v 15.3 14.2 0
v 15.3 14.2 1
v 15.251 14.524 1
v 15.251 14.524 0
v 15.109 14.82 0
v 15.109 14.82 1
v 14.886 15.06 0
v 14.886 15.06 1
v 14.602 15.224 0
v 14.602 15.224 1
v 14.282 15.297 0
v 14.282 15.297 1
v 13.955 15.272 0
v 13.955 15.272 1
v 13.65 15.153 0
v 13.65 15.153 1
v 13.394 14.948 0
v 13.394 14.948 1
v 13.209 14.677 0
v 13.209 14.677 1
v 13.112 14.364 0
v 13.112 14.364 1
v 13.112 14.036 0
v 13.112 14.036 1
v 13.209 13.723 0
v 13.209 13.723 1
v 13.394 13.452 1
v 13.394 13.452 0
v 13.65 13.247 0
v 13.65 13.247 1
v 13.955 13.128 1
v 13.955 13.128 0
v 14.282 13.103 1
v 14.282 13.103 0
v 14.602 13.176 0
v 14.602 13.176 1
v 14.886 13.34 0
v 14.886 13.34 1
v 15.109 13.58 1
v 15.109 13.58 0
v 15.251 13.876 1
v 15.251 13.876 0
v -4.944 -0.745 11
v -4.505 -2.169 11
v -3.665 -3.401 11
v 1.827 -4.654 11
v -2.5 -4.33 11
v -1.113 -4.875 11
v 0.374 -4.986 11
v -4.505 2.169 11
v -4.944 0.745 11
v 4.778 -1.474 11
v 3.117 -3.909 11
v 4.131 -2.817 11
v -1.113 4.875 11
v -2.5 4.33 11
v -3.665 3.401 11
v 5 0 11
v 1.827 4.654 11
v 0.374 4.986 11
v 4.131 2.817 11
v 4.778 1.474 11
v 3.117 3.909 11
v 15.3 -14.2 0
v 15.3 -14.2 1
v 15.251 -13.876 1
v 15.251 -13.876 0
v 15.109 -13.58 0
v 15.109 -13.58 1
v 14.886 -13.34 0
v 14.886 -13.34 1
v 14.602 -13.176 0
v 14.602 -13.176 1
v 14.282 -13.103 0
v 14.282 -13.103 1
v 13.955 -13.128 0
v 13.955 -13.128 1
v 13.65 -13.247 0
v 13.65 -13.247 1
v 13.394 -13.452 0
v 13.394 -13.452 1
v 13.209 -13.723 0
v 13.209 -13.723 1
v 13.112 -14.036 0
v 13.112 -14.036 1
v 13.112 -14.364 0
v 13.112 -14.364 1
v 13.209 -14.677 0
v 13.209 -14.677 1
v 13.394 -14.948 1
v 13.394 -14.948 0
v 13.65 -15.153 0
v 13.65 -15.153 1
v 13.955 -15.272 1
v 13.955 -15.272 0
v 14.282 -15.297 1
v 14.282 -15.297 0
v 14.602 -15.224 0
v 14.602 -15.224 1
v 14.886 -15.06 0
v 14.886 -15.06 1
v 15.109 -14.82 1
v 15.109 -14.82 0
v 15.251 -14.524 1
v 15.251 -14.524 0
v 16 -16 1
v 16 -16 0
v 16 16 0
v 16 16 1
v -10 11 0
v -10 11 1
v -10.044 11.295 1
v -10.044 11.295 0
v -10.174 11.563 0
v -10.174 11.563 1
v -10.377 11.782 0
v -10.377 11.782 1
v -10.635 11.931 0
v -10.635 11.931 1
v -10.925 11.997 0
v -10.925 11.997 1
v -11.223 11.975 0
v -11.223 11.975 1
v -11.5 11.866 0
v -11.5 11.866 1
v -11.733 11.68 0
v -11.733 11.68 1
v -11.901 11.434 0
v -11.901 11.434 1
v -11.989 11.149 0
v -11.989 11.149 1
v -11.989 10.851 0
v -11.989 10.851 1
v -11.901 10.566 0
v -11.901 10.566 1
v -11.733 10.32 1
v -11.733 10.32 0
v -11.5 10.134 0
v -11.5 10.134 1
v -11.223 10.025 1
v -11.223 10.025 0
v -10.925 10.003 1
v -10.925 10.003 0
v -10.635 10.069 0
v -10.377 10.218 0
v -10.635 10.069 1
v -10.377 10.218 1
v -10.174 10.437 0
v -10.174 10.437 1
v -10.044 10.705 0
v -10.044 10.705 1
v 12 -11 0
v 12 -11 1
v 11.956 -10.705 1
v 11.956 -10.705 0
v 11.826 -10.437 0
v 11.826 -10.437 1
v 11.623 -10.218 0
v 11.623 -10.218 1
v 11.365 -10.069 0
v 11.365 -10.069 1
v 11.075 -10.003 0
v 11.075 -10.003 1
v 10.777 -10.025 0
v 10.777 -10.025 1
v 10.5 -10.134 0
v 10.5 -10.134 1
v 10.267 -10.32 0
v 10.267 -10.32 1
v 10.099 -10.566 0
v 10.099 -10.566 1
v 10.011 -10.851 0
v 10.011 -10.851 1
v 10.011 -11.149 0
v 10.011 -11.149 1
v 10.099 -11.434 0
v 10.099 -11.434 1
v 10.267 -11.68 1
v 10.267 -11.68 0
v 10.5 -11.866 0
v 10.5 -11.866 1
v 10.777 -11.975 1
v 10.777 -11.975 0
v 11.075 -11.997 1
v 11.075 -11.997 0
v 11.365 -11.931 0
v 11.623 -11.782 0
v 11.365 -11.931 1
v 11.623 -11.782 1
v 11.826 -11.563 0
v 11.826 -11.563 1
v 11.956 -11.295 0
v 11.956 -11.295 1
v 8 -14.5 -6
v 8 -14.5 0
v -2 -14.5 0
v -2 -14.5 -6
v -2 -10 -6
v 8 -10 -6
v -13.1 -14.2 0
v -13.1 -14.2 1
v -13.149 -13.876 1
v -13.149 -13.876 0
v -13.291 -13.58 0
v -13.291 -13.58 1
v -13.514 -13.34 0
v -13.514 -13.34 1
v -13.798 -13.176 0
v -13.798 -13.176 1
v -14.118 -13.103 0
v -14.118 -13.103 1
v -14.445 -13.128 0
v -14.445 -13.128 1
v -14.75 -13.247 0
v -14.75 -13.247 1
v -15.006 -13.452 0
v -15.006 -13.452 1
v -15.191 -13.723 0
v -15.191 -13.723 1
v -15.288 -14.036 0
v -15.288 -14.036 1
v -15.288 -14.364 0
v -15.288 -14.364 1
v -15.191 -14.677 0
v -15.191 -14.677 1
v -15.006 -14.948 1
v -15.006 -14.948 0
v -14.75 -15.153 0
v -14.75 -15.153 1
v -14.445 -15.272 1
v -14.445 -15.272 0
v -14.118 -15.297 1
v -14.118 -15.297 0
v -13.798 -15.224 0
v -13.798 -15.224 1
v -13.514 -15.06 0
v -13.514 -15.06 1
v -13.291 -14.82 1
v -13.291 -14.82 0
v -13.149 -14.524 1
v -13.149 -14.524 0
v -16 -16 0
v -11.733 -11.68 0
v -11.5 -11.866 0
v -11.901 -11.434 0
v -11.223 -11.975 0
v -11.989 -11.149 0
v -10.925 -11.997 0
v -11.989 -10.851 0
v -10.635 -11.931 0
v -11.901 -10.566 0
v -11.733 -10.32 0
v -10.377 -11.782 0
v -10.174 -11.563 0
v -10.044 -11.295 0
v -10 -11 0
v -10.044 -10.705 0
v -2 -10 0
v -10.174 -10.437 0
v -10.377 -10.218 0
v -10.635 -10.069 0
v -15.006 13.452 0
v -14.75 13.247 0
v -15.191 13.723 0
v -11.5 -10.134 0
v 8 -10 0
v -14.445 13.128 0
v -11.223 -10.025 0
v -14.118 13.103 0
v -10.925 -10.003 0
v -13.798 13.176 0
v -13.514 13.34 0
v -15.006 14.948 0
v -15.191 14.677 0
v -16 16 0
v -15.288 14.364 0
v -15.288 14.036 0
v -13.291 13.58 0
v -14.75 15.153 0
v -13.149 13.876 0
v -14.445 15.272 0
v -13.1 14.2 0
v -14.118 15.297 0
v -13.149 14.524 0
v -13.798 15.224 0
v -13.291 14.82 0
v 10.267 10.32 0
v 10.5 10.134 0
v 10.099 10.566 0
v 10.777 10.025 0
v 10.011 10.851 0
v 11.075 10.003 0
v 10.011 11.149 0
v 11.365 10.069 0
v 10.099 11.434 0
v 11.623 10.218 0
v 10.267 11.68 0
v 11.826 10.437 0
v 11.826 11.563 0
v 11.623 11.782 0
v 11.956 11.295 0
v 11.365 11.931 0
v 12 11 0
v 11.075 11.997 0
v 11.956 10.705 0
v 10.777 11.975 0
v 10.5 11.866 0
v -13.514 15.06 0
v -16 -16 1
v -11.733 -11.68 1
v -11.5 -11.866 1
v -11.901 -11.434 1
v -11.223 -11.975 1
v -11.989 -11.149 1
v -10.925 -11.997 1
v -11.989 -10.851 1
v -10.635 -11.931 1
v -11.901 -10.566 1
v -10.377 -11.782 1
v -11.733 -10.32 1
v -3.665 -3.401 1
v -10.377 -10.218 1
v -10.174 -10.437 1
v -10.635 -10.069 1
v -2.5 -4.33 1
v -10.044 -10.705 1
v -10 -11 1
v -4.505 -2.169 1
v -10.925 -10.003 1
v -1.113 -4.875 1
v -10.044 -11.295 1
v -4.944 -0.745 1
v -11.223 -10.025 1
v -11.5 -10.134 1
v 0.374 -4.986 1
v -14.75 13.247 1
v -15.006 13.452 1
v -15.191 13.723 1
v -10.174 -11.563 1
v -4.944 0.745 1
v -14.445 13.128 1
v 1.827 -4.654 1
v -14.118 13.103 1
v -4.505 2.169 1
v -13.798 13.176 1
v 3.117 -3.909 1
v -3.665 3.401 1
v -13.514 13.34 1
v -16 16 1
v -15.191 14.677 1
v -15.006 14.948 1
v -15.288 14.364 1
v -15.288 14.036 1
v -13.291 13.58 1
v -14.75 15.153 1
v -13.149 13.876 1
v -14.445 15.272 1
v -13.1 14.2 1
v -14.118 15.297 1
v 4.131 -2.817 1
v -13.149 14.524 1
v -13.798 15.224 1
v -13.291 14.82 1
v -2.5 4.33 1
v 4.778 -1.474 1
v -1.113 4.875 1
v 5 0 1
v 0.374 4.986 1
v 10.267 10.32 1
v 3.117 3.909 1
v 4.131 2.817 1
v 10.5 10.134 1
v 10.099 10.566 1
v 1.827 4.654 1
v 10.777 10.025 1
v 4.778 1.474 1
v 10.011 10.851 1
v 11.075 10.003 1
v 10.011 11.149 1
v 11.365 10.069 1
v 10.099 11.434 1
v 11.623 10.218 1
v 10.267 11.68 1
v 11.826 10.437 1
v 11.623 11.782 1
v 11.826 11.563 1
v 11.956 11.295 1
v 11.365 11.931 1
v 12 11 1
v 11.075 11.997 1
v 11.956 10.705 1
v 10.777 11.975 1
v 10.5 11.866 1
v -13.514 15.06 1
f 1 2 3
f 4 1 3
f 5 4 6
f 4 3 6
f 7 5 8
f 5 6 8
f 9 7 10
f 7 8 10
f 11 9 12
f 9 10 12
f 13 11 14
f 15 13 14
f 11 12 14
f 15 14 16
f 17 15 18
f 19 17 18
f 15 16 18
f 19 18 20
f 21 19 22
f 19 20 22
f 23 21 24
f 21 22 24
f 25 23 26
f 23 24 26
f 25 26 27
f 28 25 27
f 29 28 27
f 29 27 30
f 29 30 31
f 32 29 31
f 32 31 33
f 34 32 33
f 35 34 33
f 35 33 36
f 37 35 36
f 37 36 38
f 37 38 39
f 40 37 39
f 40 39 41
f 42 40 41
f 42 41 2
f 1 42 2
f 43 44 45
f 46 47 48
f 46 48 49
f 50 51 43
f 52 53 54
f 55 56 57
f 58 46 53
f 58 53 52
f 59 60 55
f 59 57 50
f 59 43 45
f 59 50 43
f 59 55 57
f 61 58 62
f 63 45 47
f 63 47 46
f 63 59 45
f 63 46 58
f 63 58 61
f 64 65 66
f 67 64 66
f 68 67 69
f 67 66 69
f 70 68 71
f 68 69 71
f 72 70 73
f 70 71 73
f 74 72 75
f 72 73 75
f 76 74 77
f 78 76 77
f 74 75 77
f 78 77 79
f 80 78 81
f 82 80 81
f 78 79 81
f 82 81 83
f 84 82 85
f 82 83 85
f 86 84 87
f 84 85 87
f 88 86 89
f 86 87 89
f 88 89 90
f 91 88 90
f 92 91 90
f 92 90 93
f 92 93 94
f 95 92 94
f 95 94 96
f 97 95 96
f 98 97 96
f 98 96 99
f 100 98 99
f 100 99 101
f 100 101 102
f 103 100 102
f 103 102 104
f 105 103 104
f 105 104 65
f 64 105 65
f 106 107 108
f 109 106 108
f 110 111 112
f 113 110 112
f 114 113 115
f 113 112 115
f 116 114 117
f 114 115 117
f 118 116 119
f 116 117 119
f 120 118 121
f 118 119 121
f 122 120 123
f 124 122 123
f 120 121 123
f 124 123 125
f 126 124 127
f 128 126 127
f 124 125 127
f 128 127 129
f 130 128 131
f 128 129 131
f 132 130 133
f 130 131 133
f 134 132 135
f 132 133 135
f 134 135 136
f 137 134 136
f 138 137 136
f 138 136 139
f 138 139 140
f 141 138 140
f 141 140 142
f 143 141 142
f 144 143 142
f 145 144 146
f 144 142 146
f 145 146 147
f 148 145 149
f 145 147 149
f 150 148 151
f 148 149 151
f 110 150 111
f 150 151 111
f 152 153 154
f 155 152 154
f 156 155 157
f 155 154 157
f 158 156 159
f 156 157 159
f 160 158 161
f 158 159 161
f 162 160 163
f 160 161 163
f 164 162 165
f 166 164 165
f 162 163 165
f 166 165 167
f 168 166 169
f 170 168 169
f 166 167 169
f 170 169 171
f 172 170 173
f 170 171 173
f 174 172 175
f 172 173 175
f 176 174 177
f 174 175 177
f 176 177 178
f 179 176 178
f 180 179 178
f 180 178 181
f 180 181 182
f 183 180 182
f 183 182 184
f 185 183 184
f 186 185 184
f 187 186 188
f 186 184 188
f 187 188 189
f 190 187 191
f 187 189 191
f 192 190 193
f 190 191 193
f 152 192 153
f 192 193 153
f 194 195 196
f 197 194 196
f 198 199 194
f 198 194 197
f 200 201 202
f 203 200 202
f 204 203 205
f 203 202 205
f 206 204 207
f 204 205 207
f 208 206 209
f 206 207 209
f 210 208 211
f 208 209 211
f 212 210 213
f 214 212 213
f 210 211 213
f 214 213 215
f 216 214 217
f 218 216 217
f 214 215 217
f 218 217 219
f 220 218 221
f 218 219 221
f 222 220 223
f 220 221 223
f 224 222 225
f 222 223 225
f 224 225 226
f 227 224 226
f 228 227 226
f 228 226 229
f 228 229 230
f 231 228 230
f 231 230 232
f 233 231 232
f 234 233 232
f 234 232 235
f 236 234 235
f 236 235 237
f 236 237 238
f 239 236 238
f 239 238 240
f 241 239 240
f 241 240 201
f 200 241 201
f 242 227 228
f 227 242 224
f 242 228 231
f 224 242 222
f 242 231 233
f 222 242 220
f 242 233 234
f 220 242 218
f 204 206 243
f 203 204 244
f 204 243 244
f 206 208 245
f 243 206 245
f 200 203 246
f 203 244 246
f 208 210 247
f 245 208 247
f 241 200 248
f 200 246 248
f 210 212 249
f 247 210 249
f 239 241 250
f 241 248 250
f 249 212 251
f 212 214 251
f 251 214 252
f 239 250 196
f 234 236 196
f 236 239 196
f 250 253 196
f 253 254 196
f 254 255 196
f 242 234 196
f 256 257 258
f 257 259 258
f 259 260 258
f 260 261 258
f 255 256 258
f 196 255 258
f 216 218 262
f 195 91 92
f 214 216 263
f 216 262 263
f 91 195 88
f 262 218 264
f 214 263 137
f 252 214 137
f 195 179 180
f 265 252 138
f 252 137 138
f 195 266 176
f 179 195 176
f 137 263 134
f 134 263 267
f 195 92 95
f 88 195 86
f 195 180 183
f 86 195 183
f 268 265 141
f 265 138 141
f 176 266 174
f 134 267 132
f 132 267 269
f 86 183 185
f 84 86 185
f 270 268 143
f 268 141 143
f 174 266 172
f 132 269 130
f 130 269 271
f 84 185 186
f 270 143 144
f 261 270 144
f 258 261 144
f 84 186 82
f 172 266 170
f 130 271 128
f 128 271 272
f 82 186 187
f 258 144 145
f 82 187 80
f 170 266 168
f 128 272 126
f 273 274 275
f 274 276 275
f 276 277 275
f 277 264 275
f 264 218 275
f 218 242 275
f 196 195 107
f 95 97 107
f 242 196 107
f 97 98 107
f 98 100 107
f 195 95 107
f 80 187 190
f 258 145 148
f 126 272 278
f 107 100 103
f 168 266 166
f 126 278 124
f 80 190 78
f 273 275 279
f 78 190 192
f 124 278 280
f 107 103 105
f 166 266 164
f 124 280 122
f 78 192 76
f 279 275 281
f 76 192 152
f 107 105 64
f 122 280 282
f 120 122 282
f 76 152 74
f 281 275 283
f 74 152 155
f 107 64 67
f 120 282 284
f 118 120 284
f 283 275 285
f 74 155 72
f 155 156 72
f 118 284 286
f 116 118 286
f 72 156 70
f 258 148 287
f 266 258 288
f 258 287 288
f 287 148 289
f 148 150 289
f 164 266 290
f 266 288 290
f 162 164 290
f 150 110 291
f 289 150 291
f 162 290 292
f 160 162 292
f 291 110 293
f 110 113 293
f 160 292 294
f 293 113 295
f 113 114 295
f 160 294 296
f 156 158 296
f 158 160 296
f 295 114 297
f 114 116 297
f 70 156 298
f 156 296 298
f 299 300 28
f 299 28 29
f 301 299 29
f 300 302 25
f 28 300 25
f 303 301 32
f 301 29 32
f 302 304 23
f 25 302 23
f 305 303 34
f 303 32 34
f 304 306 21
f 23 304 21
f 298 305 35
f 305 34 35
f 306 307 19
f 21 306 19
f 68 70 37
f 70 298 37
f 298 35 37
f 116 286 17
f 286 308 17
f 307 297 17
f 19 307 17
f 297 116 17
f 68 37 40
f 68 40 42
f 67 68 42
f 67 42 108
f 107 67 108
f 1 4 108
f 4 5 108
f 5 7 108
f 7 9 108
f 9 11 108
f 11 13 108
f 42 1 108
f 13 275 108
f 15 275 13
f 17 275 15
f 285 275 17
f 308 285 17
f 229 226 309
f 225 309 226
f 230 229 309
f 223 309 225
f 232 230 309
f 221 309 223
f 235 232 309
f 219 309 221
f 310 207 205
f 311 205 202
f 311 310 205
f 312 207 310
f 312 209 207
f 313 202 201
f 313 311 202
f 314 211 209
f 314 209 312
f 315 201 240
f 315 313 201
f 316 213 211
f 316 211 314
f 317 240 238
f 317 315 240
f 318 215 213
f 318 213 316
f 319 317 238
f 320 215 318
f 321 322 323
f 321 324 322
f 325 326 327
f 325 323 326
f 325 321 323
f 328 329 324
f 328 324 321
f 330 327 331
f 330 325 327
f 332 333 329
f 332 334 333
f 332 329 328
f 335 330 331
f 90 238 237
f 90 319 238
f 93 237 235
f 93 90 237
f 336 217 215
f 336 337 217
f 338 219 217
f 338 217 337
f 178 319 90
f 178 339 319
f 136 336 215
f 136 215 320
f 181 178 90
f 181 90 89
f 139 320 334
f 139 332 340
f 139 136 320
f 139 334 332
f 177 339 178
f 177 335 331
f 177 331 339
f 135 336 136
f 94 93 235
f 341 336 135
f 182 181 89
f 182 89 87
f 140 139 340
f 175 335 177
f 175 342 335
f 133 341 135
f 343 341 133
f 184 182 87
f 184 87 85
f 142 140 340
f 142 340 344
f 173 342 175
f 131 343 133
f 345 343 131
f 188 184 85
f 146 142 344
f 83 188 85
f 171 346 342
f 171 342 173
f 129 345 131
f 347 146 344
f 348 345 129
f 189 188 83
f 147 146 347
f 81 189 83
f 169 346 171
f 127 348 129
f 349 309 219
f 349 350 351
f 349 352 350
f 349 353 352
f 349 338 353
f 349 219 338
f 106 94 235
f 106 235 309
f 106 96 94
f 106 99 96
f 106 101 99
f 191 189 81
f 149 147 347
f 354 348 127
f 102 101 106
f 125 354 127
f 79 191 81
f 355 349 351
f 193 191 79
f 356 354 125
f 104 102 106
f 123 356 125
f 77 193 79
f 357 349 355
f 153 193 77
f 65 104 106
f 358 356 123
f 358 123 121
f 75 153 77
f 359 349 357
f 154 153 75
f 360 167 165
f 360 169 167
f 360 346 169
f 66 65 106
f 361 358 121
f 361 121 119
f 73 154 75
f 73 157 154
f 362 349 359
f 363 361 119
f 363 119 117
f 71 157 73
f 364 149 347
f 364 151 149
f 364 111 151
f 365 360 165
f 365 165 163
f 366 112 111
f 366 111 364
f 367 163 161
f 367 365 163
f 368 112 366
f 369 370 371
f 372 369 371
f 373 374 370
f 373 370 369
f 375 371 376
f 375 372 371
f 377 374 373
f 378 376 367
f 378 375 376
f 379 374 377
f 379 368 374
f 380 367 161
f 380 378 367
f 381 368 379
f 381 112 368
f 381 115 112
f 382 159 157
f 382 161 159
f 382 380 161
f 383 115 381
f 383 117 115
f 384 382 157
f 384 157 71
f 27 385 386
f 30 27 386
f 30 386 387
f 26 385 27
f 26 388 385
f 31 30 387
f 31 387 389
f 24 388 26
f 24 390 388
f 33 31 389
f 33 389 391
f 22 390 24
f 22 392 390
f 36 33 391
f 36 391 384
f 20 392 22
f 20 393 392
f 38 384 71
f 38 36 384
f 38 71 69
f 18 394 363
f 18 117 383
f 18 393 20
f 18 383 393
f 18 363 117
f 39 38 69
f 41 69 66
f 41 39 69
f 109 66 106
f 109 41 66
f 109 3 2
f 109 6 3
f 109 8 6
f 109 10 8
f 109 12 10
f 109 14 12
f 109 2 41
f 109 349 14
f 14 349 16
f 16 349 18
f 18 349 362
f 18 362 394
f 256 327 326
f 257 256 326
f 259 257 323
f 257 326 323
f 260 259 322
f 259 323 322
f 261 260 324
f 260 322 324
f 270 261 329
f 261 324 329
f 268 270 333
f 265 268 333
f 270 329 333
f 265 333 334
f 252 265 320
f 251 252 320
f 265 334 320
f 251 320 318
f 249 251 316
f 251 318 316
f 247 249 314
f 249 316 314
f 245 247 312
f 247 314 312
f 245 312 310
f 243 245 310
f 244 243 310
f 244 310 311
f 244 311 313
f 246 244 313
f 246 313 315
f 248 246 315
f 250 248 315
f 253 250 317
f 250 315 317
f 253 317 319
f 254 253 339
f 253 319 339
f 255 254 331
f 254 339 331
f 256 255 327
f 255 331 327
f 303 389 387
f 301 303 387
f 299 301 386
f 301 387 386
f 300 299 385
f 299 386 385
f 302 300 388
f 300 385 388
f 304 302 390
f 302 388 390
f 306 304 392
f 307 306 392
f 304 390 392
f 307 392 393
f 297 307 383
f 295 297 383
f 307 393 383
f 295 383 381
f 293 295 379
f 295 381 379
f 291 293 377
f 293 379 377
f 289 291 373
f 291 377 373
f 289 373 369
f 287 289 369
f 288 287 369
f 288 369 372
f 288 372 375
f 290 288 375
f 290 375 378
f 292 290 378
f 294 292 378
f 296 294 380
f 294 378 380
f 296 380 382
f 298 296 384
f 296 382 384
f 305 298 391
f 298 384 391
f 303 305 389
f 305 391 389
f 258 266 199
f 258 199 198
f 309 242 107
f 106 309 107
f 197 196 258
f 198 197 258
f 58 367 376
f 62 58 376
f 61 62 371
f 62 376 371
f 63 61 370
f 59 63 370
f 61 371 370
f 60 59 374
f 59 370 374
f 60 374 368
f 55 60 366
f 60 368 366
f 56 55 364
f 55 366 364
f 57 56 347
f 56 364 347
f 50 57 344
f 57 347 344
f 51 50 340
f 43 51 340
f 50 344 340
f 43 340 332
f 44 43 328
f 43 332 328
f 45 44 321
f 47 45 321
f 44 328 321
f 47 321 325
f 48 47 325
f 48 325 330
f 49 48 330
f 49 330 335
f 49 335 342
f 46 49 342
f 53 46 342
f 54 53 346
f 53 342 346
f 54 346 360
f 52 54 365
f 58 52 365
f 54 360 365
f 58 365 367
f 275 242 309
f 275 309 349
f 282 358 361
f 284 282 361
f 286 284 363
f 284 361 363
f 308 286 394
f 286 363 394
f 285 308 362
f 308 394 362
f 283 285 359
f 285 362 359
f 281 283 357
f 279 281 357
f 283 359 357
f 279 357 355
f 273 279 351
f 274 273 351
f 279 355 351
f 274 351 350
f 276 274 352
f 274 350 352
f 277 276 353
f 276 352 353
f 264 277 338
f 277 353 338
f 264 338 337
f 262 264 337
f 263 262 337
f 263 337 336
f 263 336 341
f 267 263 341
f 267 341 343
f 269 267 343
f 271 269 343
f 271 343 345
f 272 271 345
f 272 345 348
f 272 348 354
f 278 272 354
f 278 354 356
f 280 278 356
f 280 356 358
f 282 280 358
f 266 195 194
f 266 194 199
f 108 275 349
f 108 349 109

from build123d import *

# Parameters (mm, degrees)
SKETCH1_W           = 32
SKETCH1_H           = 32
BOSS_EXTRUDE1_DEPTH = 1
SKETCH2_R           = 1
CUT_EXTRUDE1_DEPTH  = 1
SKETCH3_R           = 5
BOSS_EXTRUDE2_DEPTH = 10
SKETCH4_W           = 10
SKETCH4_H           = 4.5
BOSS_EXTRUDE3_DEPTH = 6
SKETCH5_R           = 1.1
CUT_EXTRUDE2_DEPTH  = 2


with BuildPart() as part:
    # Sketch1 → Boss-Extrude1 (new body)
    with BuildSketch(Plane.XY):
        Rectangle(SKETCH1_W, SKETCH1_H)
    extrude(amount=BOSS_EXTRUDE1_DEPTH)

    # Sketch2 → Cut-Extrude1 (cut)
    with BuildSketch(Plane.XY.offset(1)):
        with Locations((-11, 11)):
            Circle(SKETCH2_R)
        with Locations((11, 11)):
            Circle(SKETCH2_R)
        with Locations((11, -11)):
            Circle(SKETCH2_R)
        with Locations((-11, -11)):
            Circle(SKETCH2_R)
    extrude(amount=-CUT_EXTRUDE1_DEPTH, mode=Mode.SUBTRACT)

    # Sketch3 → Boss-Extrude2 (add)
    with BuildSketch(Plane.XY.offset(1)):
        Circle(SKETCH3_R)
    extrude(amount=BOSS_EXTRUDE2_DEPTH)

    # Sketch4 → Boss-Extrude3 (add)
    with BuildSketch(Plane(origin=(0, 0, 0), x_dir=(-1, 0, 0), z_dir=(0, 0, -1))):
        with Locations((-3, -12.25)):
            Rectangle(SKETCH4_W, SKETCH4_H)
    extrude(amount=BOSS_EXTRUDE3_DEPTH)

    # Sketch5 → Cut-Extrude2 (cut)
    with BuildSketch(Plane.XY.offset(1)):
        with Locations((-14.2, 14.2)):
            Circle(SKETCH5_R)
        with Locations((14.2, 14.2)):
            Circle(SKETCH5_R)
        with Locations((14.2, -14.2)):
            Circle(SKETCH5_R)
        with Locations((-14.2, -14.2)):
            Circle(SKETCH5_R)
    extrude(amount=-CUT_EXTRUDE2_DEPTH, mode=Mode.SUBTRACT)


solid = part.part
